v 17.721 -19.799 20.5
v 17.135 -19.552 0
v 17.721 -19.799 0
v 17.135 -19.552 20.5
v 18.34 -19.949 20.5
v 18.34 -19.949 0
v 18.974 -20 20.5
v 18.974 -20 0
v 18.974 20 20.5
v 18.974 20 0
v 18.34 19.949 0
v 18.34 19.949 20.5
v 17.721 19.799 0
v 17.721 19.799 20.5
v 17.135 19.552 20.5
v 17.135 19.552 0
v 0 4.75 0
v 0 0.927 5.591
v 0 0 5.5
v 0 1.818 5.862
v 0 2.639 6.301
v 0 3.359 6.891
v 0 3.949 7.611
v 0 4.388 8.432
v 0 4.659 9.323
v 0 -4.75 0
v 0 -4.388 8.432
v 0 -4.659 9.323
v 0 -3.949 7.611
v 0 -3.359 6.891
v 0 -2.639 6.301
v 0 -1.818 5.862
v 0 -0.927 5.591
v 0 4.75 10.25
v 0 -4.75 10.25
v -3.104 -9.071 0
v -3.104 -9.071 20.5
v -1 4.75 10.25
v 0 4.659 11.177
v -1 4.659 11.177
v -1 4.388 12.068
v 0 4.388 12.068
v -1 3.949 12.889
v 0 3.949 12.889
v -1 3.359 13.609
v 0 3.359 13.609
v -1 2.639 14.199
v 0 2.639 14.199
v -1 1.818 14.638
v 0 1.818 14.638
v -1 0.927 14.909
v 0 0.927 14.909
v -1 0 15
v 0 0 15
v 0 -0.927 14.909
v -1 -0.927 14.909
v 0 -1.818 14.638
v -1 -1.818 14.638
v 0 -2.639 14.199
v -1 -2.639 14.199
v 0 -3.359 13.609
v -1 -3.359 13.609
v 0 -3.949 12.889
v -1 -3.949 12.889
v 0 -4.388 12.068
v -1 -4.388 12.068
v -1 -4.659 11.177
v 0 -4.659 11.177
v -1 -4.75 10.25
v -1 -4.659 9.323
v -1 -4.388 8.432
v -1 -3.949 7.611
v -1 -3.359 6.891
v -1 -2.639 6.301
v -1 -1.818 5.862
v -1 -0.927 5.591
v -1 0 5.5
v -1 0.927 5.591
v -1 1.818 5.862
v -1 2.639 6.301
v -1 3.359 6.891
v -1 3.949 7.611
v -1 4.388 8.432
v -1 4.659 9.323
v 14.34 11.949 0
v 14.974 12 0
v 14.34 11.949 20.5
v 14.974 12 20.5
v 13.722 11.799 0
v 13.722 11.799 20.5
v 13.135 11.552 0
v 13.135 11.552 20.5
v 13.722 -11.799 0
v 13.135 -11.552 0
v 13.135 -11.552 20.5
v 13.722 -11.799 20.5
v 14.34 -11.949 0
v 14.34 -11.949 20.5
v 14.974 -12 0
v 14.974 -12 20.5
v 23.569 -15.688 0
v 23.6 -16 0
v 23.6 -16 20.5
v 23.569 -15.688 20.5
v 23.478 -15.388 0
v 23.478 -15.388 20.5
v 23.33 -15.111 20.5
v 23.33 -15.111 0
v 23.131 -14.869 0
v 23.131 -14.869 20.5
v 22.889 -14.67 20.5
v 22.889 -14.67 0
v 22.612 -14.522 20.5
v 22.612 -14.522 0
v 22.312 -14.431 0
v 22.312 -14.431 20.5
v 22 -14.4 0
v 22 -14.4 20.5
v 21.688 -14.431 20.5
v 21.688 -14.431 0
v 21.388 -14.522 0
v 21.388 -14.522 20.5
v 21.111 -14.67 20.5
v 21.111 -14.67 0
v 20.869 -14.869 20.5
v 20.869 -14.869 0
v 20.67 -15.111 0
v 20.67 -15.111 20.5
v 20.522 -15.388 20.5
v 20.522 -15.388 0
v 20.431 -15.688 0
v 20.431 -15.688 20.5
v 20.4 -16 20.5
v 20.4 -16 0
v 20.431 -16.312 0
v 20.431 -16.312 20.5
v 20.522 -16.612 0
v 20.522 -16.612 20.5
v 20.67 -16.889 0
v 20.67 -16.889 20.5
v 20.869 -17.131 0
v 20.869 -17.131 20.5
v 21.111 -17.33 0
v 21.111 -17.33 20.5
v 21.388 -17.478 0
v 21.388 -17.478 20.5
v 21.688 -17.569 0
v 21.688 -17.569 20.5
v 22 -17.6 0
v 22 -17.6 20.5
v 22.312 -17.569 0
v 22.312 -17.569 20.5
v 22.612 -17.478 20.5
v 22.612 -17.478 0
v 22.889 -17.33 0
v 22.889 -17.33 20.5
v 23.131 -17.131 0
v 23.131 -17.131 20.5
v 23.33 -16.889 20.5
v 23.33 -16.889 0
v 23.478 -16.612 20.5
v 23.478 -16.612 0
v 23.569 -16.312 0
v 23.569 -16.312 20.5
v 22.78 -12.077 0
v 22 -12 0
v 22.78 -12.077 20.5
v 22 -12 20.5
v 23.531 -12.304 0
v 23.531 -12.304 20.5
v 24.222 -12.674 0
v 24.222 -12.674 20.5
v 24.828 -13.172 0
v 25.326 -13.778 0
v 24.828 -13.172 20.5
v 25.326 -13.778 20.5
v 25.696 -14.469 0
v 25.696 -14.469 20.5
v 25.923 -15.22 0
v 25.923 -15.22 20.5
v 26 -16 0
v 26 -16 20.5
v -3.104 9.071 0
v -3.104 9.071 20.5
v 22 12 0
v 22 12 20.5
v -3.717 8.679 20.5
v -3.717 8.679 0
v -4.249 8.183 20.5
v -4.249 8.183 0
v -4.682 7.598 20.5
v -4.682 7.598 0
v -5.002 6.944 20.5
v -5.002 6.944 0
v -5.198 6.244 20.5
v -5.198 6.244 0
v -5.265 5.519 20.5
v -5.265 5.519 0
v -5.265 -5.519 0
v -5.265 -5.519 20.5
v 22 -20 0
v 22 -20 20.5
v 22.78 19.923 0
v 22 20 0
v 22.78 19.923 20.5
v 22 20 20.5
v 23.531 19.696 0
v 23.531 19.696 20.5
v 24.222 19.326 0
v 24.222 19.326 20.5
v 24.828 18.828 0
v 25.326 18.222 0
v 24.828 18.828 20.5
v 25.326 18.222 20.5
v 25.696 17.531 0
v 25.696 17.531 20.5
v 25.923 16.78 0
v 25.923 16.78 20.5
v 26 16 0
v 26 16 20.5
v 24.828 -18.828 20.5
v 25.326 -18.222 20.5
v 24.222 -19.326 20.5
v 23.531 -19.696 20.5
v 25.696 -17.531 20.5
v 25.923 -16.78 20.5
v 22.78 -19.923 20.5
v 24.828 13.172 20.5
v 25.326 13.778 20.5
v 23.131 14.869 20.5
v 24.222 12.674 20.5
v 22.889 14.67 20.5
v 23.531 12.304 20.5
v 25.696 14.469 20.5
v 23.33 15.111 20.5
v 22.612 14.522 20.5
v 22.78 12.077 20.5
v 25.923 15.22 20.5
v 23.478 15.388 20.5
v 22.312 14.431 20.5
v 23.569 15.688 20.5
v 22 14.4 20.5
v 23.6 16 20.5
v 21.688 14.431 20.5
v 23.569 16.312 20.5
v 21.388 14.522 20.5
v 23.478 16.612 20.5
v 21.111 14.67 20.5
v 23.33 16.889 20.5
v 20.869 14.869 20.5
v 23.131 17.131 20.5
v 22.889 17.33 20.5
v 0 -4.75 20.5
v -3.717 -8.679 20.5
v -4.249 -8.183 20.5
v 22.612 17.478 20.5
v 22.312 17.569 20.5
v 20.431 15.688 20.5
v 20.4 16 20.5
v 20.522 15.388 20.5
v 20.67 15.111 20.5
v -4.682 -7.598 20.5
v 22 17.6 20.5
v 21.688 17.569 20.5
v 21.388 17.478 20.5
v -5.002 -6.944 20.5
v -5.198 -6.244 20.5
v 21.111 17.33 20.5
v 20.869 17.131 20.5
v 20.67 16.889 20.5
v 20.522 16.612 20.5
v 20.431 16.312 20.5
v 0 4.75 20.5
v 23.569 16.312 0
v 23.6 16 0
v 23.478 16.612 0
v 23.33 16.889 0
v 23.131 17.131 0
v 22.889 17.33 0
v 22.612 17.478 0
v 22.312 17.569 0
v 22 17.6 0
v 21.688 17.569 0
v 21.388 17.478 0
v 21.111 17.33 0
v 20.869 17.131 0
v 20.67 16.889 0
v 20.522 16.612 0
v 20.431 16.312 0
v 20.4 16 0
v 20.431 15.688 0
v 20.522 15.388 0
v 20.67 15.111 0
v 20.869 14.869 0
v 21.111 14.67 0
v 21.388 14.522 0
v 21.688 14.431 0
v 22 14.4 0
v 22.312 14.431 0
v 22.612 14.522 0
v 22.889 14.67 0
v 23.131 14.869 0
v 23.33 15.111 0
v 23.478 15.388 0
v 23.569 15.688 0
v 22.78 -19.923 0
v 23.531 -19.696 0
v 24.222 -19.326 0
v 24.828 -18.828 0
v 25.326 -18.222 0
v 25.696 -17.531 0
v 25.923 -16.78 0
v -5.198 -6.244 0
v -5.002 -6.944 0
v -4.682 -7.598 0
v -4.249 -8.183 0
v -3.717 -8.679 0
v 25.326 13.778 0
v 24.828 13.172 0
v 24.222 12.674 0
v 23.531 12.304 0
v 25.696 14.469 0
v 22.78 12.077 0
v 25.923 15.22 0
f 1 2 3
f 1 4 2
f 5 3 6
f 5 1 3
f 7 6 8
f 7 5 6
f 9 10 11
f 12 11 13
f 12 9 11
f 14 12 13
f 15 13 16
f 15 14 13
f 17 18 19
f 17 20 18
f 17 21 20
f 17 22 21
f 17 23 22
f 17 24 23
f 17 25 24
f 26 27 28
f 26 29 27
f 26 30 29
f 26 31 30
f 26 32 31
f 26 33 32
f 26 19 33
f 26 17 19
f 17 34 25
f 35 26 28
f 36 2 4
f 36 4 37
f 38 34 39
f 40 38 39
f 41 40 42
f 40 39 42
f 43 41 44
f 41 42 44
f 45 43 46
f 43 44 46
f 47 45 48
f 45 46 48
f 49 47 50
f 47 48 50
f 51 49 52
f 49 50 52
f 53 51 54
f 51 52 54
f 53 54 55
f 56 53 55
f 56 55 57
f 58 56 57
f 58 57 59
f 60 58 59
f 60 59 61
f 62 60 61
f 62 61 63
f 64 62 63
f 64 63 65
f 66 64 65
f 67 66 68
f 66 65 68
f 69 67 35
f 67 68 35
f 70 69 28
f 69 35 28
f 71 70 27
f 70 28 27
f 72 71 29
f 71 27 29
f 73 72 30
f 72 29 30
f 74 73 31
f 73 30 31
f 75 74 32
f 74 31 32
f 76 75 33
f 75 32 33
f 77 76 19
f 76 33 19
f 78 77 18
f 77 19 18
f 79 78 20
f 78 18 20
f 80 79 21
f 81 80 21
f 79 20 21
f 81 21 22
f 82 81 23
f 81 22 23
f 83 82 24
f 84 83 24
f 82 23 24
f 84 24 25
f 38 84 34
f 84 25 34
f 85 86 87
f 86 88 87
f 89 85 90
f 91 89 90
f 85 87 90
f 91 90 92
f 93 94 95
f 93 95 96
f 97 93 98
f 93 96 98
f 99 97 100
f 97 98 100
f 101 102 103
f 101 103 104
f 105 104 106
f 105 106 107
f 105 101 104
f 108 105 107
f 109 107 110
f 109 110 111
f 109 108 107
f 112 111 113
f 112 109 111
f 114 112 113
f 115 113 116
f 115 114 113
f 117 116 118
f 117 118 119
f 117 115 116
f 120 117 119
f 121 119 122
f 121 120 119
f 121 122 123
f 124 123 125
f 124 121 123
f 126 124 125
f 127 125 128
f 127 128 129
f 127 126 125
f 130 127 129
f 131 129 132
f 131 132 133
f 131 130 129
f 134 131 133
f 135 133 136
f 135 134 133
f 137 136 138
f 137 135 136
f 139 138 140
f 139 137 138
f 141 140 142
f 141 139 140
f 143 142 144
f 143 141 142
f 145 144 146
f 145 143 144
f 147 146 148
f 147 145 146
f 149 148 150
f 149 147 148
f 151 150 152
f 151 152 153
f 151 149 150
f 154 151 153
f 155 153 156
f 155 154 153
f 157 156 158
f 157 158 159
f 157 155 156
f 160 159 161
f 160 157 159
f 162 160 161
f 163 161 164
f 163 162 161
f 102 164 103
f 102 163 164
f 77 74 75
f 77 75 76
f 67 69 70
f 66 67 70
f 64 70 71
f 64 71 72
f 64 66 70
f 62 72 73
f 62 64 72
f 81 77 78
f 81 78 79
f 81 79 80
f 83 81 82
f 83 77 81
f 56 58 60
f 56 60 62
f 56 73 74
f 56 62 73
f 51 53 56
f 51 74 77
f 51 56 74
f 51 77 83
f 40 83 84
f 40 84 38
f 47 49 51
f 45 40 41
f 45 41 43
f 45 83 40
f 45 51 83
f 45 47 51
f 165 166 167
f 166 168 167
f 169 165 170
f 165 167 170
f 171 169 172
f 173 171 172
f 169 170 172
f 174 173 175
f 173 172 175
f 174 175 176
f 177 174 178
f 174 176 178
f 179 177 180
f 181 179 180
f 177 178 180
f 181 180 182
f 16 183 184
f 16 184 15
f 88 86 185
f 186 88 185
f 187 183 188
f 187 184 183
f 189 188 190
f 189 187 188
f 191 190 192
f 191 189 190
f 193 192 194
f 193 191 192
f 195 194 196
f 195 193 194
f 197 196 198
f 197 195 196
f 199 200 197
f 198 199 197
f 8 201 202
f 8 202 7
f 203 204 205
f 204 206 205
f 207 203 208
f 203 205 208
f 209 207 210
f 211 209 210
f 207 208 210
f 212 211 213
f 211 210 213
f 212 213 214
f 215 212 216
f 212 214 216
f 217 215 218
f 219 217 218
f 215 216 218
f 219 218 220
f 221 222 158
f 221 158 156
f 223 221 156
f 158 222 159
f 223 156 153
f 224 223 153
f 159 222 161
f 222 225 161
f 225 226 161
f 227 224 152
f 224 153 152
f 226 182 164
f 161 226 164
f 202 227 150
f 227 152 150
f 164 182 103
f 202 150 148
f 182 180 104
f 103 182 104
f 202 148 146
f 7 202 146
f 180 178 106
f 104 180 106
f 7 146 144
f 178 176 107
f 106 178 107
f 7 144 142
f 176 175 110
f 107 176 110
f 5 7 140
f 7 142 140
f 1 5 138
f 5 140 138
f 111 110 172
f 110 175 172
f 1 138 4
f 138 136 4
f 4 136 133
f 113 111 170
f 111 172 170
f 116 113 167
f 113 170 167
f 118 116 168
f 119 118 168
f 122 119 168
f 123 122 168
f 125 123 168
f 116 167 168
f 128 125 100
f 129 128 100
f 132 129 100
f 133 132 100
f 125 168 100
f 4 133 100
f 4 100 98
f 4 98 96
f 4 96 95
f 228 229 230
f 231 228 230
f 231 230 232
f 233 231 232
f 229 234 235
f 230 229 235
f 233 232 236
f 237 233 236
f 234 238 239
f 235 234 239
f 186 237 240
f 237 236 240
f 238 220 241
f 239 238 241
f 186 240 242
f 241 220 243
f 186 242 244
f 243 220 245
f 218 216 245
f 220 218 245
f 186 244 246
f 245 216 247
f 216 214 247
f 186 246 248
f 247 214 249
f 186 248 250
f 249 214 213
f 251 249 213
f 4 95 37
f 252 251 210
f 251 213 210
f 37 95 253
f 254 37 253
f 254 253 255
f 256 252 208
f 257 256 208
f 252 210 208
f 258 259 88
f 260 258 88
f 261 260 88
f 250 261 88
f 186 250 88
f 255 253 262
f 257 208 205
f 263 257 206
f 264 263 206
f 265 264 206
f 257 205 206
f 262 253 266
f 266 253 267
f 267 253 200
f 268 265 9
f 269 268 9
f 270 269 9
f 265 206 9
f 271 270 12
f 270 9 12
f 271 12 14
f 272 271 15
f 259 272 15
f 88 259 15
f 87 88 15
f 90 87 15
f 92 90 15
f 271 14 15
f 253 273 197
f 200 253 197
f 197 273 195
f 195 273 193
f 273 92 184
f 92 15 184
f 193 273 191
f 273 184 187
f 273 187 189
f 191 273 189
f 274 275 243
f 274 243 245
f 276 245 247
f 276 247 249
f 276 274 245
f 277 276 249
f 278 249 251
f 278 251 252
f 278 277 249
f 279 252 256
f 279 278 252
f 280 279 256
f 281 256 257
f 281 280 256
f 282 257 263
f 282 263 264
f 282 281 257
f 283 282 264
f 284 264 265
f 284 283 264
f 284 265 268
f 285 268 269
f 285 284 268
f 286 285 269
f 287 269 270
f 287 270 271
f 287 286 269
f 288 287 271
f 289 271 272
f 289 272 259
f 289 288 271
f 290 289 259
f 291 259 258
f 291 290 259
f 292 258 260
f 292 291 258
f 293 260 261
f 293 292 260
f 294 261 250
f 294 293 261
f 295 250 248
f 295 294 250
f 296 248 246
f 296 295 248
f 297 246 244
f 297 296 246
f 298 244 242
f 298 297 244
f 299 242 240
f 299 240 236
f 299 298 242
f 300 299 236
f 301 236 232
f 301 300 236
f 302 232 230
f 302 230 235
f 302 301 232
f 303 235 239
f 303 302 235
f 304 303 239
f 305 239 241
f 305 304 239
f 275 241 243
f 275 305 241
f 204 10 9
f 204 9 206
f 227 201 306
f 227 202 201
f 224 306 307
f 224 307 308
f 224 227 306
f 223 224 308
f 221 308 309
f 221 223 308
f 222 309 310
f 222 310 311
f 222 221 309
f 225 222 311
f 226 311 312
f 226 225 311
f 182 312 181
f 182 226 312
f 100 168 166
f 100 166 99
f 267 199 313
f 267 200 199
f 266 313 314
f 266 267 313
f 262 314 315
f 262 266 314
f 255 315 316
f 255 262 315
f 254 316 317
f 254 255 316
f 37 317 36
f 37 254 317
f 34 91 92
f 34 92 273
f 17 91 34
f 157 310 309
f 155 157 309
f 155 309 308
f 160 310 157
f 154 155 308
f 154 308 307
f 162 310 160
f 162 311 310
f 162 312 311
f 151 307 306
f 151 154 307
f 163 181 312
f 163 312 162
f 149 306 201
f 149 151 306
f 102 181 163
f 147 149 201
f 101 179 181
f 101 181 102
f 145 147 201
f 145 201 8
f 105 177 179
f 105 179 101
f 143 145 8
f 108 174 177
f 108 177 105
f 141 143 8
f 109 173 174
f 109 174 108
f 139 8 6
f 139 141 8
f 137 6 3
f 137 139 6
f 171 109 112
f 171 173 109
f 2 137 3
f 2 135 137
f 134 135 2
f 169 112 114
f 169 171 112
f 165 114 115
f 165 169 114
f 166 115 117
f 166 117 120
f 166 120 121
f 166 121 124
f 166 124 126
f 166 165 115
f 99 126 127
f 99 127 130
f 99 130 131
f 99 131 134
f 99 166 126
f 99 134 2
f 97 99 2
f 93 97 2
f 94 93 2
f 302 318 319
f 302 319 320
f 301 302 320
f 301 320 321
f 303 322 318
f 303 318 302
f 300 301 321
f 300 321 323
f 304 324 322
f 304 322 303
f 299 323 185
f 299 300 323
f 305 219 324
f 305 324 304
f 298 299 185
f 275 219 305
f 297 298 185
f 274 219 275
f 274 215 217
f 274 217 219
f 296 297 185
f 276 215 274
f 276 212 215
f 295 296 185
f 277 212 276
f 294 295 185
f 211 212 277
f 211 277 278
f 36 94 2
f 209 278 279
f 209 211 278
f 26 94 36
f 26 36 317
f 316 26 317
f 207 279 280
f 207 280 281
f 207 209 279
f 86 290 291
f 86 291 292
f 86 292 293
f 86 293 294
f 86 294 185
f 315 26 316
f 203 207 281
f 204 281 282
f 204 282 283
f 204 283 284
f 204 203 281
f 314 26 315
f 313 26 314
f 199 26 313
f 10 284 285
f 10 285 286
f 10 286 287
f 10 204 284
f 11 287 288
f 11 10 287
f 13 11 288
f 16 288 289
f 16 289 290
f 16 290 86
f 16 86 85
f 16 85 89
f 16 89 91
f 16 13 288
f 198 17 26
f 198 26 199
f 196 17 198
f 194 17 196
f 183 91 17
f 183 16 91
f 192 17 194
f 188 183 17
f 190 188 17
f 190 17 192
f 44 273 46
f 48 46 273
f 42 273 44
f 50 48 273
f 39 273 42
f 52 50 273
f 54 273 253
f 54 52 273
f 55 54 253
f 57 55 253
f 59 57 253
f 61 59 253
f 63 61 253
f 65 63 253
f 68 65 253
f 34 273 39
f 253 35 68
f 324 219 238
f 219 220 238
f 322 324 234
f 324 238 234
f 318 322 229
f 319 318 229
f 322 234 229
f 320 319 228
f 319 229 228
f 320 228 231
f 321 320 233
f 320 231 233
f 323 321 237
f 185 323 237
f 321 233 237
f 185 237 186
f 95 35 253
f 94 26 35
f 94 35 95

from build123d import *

# Parameters (mm, degrees)
SKETCH_R     = 1.6
PAD_DEPTH    = 20.5
SKETCH001_R  = 4.75
POCKET_DEPTH = 1
FILLET_R     = 4
FILLET001_R  = 3.9999


with BuildPart() as part:
    # Sketch → Pad (new body)
    with BuildSketch(Plane.XY):
        Polygon((18, 20), (26, 20), (26, 12), (18, 12), (14, 12), (0, 4.75), (0, -4.75), (14, -12), (18, -12), (26, -12), (26, -20), (18, -20), (-5.264538, -7.952293), (-5.264538, 7.952293), align=None)
        with Locations((22, 16)):
            Circle(SKETCH_R, mode=Mode.SUBTRACT)
        with Locations((22, -16)):
            Circle(SKETCH_R, mode=Mode.SUBTRACT)
    extrude(amount=PAD_DEPTH)

    # Sketch001 → Pocket (cut)
    with BuildSketch(Plane.YZ):
        with Locations((0, 10.25)):
            Circle(SKETCH001_R)
    extrude(amount=-POCKET_DEPTH, mode=Mode.SUBTRACT)

    # Fillet
    fillet_edges = [part.edges().sort_by_distance(p)[0] for p in [
        (26, -20, 10.25),
        (18, -20, 10.25),
        (-5.264538, -7.952293, 10.25),
        (-5.264538, 7.952293, 10.25),
        (18, 20, 10.25),
        (26, 20, 10.25),
    ]]
    fillet(fillet_edges, radius=FILLET_R)

    # Fillet001
    fillet001_edges = [part.edges().sort_by_distance(p)[0] for p in [
        (26, -12, 10.25),
        (14, -12, 10.25),
        (14, 12, 10.25),
        (26, 12, 10.25),
    ]]
    fillet(fillet001_edges, radius=FILLET001_R)


solid = part.part
